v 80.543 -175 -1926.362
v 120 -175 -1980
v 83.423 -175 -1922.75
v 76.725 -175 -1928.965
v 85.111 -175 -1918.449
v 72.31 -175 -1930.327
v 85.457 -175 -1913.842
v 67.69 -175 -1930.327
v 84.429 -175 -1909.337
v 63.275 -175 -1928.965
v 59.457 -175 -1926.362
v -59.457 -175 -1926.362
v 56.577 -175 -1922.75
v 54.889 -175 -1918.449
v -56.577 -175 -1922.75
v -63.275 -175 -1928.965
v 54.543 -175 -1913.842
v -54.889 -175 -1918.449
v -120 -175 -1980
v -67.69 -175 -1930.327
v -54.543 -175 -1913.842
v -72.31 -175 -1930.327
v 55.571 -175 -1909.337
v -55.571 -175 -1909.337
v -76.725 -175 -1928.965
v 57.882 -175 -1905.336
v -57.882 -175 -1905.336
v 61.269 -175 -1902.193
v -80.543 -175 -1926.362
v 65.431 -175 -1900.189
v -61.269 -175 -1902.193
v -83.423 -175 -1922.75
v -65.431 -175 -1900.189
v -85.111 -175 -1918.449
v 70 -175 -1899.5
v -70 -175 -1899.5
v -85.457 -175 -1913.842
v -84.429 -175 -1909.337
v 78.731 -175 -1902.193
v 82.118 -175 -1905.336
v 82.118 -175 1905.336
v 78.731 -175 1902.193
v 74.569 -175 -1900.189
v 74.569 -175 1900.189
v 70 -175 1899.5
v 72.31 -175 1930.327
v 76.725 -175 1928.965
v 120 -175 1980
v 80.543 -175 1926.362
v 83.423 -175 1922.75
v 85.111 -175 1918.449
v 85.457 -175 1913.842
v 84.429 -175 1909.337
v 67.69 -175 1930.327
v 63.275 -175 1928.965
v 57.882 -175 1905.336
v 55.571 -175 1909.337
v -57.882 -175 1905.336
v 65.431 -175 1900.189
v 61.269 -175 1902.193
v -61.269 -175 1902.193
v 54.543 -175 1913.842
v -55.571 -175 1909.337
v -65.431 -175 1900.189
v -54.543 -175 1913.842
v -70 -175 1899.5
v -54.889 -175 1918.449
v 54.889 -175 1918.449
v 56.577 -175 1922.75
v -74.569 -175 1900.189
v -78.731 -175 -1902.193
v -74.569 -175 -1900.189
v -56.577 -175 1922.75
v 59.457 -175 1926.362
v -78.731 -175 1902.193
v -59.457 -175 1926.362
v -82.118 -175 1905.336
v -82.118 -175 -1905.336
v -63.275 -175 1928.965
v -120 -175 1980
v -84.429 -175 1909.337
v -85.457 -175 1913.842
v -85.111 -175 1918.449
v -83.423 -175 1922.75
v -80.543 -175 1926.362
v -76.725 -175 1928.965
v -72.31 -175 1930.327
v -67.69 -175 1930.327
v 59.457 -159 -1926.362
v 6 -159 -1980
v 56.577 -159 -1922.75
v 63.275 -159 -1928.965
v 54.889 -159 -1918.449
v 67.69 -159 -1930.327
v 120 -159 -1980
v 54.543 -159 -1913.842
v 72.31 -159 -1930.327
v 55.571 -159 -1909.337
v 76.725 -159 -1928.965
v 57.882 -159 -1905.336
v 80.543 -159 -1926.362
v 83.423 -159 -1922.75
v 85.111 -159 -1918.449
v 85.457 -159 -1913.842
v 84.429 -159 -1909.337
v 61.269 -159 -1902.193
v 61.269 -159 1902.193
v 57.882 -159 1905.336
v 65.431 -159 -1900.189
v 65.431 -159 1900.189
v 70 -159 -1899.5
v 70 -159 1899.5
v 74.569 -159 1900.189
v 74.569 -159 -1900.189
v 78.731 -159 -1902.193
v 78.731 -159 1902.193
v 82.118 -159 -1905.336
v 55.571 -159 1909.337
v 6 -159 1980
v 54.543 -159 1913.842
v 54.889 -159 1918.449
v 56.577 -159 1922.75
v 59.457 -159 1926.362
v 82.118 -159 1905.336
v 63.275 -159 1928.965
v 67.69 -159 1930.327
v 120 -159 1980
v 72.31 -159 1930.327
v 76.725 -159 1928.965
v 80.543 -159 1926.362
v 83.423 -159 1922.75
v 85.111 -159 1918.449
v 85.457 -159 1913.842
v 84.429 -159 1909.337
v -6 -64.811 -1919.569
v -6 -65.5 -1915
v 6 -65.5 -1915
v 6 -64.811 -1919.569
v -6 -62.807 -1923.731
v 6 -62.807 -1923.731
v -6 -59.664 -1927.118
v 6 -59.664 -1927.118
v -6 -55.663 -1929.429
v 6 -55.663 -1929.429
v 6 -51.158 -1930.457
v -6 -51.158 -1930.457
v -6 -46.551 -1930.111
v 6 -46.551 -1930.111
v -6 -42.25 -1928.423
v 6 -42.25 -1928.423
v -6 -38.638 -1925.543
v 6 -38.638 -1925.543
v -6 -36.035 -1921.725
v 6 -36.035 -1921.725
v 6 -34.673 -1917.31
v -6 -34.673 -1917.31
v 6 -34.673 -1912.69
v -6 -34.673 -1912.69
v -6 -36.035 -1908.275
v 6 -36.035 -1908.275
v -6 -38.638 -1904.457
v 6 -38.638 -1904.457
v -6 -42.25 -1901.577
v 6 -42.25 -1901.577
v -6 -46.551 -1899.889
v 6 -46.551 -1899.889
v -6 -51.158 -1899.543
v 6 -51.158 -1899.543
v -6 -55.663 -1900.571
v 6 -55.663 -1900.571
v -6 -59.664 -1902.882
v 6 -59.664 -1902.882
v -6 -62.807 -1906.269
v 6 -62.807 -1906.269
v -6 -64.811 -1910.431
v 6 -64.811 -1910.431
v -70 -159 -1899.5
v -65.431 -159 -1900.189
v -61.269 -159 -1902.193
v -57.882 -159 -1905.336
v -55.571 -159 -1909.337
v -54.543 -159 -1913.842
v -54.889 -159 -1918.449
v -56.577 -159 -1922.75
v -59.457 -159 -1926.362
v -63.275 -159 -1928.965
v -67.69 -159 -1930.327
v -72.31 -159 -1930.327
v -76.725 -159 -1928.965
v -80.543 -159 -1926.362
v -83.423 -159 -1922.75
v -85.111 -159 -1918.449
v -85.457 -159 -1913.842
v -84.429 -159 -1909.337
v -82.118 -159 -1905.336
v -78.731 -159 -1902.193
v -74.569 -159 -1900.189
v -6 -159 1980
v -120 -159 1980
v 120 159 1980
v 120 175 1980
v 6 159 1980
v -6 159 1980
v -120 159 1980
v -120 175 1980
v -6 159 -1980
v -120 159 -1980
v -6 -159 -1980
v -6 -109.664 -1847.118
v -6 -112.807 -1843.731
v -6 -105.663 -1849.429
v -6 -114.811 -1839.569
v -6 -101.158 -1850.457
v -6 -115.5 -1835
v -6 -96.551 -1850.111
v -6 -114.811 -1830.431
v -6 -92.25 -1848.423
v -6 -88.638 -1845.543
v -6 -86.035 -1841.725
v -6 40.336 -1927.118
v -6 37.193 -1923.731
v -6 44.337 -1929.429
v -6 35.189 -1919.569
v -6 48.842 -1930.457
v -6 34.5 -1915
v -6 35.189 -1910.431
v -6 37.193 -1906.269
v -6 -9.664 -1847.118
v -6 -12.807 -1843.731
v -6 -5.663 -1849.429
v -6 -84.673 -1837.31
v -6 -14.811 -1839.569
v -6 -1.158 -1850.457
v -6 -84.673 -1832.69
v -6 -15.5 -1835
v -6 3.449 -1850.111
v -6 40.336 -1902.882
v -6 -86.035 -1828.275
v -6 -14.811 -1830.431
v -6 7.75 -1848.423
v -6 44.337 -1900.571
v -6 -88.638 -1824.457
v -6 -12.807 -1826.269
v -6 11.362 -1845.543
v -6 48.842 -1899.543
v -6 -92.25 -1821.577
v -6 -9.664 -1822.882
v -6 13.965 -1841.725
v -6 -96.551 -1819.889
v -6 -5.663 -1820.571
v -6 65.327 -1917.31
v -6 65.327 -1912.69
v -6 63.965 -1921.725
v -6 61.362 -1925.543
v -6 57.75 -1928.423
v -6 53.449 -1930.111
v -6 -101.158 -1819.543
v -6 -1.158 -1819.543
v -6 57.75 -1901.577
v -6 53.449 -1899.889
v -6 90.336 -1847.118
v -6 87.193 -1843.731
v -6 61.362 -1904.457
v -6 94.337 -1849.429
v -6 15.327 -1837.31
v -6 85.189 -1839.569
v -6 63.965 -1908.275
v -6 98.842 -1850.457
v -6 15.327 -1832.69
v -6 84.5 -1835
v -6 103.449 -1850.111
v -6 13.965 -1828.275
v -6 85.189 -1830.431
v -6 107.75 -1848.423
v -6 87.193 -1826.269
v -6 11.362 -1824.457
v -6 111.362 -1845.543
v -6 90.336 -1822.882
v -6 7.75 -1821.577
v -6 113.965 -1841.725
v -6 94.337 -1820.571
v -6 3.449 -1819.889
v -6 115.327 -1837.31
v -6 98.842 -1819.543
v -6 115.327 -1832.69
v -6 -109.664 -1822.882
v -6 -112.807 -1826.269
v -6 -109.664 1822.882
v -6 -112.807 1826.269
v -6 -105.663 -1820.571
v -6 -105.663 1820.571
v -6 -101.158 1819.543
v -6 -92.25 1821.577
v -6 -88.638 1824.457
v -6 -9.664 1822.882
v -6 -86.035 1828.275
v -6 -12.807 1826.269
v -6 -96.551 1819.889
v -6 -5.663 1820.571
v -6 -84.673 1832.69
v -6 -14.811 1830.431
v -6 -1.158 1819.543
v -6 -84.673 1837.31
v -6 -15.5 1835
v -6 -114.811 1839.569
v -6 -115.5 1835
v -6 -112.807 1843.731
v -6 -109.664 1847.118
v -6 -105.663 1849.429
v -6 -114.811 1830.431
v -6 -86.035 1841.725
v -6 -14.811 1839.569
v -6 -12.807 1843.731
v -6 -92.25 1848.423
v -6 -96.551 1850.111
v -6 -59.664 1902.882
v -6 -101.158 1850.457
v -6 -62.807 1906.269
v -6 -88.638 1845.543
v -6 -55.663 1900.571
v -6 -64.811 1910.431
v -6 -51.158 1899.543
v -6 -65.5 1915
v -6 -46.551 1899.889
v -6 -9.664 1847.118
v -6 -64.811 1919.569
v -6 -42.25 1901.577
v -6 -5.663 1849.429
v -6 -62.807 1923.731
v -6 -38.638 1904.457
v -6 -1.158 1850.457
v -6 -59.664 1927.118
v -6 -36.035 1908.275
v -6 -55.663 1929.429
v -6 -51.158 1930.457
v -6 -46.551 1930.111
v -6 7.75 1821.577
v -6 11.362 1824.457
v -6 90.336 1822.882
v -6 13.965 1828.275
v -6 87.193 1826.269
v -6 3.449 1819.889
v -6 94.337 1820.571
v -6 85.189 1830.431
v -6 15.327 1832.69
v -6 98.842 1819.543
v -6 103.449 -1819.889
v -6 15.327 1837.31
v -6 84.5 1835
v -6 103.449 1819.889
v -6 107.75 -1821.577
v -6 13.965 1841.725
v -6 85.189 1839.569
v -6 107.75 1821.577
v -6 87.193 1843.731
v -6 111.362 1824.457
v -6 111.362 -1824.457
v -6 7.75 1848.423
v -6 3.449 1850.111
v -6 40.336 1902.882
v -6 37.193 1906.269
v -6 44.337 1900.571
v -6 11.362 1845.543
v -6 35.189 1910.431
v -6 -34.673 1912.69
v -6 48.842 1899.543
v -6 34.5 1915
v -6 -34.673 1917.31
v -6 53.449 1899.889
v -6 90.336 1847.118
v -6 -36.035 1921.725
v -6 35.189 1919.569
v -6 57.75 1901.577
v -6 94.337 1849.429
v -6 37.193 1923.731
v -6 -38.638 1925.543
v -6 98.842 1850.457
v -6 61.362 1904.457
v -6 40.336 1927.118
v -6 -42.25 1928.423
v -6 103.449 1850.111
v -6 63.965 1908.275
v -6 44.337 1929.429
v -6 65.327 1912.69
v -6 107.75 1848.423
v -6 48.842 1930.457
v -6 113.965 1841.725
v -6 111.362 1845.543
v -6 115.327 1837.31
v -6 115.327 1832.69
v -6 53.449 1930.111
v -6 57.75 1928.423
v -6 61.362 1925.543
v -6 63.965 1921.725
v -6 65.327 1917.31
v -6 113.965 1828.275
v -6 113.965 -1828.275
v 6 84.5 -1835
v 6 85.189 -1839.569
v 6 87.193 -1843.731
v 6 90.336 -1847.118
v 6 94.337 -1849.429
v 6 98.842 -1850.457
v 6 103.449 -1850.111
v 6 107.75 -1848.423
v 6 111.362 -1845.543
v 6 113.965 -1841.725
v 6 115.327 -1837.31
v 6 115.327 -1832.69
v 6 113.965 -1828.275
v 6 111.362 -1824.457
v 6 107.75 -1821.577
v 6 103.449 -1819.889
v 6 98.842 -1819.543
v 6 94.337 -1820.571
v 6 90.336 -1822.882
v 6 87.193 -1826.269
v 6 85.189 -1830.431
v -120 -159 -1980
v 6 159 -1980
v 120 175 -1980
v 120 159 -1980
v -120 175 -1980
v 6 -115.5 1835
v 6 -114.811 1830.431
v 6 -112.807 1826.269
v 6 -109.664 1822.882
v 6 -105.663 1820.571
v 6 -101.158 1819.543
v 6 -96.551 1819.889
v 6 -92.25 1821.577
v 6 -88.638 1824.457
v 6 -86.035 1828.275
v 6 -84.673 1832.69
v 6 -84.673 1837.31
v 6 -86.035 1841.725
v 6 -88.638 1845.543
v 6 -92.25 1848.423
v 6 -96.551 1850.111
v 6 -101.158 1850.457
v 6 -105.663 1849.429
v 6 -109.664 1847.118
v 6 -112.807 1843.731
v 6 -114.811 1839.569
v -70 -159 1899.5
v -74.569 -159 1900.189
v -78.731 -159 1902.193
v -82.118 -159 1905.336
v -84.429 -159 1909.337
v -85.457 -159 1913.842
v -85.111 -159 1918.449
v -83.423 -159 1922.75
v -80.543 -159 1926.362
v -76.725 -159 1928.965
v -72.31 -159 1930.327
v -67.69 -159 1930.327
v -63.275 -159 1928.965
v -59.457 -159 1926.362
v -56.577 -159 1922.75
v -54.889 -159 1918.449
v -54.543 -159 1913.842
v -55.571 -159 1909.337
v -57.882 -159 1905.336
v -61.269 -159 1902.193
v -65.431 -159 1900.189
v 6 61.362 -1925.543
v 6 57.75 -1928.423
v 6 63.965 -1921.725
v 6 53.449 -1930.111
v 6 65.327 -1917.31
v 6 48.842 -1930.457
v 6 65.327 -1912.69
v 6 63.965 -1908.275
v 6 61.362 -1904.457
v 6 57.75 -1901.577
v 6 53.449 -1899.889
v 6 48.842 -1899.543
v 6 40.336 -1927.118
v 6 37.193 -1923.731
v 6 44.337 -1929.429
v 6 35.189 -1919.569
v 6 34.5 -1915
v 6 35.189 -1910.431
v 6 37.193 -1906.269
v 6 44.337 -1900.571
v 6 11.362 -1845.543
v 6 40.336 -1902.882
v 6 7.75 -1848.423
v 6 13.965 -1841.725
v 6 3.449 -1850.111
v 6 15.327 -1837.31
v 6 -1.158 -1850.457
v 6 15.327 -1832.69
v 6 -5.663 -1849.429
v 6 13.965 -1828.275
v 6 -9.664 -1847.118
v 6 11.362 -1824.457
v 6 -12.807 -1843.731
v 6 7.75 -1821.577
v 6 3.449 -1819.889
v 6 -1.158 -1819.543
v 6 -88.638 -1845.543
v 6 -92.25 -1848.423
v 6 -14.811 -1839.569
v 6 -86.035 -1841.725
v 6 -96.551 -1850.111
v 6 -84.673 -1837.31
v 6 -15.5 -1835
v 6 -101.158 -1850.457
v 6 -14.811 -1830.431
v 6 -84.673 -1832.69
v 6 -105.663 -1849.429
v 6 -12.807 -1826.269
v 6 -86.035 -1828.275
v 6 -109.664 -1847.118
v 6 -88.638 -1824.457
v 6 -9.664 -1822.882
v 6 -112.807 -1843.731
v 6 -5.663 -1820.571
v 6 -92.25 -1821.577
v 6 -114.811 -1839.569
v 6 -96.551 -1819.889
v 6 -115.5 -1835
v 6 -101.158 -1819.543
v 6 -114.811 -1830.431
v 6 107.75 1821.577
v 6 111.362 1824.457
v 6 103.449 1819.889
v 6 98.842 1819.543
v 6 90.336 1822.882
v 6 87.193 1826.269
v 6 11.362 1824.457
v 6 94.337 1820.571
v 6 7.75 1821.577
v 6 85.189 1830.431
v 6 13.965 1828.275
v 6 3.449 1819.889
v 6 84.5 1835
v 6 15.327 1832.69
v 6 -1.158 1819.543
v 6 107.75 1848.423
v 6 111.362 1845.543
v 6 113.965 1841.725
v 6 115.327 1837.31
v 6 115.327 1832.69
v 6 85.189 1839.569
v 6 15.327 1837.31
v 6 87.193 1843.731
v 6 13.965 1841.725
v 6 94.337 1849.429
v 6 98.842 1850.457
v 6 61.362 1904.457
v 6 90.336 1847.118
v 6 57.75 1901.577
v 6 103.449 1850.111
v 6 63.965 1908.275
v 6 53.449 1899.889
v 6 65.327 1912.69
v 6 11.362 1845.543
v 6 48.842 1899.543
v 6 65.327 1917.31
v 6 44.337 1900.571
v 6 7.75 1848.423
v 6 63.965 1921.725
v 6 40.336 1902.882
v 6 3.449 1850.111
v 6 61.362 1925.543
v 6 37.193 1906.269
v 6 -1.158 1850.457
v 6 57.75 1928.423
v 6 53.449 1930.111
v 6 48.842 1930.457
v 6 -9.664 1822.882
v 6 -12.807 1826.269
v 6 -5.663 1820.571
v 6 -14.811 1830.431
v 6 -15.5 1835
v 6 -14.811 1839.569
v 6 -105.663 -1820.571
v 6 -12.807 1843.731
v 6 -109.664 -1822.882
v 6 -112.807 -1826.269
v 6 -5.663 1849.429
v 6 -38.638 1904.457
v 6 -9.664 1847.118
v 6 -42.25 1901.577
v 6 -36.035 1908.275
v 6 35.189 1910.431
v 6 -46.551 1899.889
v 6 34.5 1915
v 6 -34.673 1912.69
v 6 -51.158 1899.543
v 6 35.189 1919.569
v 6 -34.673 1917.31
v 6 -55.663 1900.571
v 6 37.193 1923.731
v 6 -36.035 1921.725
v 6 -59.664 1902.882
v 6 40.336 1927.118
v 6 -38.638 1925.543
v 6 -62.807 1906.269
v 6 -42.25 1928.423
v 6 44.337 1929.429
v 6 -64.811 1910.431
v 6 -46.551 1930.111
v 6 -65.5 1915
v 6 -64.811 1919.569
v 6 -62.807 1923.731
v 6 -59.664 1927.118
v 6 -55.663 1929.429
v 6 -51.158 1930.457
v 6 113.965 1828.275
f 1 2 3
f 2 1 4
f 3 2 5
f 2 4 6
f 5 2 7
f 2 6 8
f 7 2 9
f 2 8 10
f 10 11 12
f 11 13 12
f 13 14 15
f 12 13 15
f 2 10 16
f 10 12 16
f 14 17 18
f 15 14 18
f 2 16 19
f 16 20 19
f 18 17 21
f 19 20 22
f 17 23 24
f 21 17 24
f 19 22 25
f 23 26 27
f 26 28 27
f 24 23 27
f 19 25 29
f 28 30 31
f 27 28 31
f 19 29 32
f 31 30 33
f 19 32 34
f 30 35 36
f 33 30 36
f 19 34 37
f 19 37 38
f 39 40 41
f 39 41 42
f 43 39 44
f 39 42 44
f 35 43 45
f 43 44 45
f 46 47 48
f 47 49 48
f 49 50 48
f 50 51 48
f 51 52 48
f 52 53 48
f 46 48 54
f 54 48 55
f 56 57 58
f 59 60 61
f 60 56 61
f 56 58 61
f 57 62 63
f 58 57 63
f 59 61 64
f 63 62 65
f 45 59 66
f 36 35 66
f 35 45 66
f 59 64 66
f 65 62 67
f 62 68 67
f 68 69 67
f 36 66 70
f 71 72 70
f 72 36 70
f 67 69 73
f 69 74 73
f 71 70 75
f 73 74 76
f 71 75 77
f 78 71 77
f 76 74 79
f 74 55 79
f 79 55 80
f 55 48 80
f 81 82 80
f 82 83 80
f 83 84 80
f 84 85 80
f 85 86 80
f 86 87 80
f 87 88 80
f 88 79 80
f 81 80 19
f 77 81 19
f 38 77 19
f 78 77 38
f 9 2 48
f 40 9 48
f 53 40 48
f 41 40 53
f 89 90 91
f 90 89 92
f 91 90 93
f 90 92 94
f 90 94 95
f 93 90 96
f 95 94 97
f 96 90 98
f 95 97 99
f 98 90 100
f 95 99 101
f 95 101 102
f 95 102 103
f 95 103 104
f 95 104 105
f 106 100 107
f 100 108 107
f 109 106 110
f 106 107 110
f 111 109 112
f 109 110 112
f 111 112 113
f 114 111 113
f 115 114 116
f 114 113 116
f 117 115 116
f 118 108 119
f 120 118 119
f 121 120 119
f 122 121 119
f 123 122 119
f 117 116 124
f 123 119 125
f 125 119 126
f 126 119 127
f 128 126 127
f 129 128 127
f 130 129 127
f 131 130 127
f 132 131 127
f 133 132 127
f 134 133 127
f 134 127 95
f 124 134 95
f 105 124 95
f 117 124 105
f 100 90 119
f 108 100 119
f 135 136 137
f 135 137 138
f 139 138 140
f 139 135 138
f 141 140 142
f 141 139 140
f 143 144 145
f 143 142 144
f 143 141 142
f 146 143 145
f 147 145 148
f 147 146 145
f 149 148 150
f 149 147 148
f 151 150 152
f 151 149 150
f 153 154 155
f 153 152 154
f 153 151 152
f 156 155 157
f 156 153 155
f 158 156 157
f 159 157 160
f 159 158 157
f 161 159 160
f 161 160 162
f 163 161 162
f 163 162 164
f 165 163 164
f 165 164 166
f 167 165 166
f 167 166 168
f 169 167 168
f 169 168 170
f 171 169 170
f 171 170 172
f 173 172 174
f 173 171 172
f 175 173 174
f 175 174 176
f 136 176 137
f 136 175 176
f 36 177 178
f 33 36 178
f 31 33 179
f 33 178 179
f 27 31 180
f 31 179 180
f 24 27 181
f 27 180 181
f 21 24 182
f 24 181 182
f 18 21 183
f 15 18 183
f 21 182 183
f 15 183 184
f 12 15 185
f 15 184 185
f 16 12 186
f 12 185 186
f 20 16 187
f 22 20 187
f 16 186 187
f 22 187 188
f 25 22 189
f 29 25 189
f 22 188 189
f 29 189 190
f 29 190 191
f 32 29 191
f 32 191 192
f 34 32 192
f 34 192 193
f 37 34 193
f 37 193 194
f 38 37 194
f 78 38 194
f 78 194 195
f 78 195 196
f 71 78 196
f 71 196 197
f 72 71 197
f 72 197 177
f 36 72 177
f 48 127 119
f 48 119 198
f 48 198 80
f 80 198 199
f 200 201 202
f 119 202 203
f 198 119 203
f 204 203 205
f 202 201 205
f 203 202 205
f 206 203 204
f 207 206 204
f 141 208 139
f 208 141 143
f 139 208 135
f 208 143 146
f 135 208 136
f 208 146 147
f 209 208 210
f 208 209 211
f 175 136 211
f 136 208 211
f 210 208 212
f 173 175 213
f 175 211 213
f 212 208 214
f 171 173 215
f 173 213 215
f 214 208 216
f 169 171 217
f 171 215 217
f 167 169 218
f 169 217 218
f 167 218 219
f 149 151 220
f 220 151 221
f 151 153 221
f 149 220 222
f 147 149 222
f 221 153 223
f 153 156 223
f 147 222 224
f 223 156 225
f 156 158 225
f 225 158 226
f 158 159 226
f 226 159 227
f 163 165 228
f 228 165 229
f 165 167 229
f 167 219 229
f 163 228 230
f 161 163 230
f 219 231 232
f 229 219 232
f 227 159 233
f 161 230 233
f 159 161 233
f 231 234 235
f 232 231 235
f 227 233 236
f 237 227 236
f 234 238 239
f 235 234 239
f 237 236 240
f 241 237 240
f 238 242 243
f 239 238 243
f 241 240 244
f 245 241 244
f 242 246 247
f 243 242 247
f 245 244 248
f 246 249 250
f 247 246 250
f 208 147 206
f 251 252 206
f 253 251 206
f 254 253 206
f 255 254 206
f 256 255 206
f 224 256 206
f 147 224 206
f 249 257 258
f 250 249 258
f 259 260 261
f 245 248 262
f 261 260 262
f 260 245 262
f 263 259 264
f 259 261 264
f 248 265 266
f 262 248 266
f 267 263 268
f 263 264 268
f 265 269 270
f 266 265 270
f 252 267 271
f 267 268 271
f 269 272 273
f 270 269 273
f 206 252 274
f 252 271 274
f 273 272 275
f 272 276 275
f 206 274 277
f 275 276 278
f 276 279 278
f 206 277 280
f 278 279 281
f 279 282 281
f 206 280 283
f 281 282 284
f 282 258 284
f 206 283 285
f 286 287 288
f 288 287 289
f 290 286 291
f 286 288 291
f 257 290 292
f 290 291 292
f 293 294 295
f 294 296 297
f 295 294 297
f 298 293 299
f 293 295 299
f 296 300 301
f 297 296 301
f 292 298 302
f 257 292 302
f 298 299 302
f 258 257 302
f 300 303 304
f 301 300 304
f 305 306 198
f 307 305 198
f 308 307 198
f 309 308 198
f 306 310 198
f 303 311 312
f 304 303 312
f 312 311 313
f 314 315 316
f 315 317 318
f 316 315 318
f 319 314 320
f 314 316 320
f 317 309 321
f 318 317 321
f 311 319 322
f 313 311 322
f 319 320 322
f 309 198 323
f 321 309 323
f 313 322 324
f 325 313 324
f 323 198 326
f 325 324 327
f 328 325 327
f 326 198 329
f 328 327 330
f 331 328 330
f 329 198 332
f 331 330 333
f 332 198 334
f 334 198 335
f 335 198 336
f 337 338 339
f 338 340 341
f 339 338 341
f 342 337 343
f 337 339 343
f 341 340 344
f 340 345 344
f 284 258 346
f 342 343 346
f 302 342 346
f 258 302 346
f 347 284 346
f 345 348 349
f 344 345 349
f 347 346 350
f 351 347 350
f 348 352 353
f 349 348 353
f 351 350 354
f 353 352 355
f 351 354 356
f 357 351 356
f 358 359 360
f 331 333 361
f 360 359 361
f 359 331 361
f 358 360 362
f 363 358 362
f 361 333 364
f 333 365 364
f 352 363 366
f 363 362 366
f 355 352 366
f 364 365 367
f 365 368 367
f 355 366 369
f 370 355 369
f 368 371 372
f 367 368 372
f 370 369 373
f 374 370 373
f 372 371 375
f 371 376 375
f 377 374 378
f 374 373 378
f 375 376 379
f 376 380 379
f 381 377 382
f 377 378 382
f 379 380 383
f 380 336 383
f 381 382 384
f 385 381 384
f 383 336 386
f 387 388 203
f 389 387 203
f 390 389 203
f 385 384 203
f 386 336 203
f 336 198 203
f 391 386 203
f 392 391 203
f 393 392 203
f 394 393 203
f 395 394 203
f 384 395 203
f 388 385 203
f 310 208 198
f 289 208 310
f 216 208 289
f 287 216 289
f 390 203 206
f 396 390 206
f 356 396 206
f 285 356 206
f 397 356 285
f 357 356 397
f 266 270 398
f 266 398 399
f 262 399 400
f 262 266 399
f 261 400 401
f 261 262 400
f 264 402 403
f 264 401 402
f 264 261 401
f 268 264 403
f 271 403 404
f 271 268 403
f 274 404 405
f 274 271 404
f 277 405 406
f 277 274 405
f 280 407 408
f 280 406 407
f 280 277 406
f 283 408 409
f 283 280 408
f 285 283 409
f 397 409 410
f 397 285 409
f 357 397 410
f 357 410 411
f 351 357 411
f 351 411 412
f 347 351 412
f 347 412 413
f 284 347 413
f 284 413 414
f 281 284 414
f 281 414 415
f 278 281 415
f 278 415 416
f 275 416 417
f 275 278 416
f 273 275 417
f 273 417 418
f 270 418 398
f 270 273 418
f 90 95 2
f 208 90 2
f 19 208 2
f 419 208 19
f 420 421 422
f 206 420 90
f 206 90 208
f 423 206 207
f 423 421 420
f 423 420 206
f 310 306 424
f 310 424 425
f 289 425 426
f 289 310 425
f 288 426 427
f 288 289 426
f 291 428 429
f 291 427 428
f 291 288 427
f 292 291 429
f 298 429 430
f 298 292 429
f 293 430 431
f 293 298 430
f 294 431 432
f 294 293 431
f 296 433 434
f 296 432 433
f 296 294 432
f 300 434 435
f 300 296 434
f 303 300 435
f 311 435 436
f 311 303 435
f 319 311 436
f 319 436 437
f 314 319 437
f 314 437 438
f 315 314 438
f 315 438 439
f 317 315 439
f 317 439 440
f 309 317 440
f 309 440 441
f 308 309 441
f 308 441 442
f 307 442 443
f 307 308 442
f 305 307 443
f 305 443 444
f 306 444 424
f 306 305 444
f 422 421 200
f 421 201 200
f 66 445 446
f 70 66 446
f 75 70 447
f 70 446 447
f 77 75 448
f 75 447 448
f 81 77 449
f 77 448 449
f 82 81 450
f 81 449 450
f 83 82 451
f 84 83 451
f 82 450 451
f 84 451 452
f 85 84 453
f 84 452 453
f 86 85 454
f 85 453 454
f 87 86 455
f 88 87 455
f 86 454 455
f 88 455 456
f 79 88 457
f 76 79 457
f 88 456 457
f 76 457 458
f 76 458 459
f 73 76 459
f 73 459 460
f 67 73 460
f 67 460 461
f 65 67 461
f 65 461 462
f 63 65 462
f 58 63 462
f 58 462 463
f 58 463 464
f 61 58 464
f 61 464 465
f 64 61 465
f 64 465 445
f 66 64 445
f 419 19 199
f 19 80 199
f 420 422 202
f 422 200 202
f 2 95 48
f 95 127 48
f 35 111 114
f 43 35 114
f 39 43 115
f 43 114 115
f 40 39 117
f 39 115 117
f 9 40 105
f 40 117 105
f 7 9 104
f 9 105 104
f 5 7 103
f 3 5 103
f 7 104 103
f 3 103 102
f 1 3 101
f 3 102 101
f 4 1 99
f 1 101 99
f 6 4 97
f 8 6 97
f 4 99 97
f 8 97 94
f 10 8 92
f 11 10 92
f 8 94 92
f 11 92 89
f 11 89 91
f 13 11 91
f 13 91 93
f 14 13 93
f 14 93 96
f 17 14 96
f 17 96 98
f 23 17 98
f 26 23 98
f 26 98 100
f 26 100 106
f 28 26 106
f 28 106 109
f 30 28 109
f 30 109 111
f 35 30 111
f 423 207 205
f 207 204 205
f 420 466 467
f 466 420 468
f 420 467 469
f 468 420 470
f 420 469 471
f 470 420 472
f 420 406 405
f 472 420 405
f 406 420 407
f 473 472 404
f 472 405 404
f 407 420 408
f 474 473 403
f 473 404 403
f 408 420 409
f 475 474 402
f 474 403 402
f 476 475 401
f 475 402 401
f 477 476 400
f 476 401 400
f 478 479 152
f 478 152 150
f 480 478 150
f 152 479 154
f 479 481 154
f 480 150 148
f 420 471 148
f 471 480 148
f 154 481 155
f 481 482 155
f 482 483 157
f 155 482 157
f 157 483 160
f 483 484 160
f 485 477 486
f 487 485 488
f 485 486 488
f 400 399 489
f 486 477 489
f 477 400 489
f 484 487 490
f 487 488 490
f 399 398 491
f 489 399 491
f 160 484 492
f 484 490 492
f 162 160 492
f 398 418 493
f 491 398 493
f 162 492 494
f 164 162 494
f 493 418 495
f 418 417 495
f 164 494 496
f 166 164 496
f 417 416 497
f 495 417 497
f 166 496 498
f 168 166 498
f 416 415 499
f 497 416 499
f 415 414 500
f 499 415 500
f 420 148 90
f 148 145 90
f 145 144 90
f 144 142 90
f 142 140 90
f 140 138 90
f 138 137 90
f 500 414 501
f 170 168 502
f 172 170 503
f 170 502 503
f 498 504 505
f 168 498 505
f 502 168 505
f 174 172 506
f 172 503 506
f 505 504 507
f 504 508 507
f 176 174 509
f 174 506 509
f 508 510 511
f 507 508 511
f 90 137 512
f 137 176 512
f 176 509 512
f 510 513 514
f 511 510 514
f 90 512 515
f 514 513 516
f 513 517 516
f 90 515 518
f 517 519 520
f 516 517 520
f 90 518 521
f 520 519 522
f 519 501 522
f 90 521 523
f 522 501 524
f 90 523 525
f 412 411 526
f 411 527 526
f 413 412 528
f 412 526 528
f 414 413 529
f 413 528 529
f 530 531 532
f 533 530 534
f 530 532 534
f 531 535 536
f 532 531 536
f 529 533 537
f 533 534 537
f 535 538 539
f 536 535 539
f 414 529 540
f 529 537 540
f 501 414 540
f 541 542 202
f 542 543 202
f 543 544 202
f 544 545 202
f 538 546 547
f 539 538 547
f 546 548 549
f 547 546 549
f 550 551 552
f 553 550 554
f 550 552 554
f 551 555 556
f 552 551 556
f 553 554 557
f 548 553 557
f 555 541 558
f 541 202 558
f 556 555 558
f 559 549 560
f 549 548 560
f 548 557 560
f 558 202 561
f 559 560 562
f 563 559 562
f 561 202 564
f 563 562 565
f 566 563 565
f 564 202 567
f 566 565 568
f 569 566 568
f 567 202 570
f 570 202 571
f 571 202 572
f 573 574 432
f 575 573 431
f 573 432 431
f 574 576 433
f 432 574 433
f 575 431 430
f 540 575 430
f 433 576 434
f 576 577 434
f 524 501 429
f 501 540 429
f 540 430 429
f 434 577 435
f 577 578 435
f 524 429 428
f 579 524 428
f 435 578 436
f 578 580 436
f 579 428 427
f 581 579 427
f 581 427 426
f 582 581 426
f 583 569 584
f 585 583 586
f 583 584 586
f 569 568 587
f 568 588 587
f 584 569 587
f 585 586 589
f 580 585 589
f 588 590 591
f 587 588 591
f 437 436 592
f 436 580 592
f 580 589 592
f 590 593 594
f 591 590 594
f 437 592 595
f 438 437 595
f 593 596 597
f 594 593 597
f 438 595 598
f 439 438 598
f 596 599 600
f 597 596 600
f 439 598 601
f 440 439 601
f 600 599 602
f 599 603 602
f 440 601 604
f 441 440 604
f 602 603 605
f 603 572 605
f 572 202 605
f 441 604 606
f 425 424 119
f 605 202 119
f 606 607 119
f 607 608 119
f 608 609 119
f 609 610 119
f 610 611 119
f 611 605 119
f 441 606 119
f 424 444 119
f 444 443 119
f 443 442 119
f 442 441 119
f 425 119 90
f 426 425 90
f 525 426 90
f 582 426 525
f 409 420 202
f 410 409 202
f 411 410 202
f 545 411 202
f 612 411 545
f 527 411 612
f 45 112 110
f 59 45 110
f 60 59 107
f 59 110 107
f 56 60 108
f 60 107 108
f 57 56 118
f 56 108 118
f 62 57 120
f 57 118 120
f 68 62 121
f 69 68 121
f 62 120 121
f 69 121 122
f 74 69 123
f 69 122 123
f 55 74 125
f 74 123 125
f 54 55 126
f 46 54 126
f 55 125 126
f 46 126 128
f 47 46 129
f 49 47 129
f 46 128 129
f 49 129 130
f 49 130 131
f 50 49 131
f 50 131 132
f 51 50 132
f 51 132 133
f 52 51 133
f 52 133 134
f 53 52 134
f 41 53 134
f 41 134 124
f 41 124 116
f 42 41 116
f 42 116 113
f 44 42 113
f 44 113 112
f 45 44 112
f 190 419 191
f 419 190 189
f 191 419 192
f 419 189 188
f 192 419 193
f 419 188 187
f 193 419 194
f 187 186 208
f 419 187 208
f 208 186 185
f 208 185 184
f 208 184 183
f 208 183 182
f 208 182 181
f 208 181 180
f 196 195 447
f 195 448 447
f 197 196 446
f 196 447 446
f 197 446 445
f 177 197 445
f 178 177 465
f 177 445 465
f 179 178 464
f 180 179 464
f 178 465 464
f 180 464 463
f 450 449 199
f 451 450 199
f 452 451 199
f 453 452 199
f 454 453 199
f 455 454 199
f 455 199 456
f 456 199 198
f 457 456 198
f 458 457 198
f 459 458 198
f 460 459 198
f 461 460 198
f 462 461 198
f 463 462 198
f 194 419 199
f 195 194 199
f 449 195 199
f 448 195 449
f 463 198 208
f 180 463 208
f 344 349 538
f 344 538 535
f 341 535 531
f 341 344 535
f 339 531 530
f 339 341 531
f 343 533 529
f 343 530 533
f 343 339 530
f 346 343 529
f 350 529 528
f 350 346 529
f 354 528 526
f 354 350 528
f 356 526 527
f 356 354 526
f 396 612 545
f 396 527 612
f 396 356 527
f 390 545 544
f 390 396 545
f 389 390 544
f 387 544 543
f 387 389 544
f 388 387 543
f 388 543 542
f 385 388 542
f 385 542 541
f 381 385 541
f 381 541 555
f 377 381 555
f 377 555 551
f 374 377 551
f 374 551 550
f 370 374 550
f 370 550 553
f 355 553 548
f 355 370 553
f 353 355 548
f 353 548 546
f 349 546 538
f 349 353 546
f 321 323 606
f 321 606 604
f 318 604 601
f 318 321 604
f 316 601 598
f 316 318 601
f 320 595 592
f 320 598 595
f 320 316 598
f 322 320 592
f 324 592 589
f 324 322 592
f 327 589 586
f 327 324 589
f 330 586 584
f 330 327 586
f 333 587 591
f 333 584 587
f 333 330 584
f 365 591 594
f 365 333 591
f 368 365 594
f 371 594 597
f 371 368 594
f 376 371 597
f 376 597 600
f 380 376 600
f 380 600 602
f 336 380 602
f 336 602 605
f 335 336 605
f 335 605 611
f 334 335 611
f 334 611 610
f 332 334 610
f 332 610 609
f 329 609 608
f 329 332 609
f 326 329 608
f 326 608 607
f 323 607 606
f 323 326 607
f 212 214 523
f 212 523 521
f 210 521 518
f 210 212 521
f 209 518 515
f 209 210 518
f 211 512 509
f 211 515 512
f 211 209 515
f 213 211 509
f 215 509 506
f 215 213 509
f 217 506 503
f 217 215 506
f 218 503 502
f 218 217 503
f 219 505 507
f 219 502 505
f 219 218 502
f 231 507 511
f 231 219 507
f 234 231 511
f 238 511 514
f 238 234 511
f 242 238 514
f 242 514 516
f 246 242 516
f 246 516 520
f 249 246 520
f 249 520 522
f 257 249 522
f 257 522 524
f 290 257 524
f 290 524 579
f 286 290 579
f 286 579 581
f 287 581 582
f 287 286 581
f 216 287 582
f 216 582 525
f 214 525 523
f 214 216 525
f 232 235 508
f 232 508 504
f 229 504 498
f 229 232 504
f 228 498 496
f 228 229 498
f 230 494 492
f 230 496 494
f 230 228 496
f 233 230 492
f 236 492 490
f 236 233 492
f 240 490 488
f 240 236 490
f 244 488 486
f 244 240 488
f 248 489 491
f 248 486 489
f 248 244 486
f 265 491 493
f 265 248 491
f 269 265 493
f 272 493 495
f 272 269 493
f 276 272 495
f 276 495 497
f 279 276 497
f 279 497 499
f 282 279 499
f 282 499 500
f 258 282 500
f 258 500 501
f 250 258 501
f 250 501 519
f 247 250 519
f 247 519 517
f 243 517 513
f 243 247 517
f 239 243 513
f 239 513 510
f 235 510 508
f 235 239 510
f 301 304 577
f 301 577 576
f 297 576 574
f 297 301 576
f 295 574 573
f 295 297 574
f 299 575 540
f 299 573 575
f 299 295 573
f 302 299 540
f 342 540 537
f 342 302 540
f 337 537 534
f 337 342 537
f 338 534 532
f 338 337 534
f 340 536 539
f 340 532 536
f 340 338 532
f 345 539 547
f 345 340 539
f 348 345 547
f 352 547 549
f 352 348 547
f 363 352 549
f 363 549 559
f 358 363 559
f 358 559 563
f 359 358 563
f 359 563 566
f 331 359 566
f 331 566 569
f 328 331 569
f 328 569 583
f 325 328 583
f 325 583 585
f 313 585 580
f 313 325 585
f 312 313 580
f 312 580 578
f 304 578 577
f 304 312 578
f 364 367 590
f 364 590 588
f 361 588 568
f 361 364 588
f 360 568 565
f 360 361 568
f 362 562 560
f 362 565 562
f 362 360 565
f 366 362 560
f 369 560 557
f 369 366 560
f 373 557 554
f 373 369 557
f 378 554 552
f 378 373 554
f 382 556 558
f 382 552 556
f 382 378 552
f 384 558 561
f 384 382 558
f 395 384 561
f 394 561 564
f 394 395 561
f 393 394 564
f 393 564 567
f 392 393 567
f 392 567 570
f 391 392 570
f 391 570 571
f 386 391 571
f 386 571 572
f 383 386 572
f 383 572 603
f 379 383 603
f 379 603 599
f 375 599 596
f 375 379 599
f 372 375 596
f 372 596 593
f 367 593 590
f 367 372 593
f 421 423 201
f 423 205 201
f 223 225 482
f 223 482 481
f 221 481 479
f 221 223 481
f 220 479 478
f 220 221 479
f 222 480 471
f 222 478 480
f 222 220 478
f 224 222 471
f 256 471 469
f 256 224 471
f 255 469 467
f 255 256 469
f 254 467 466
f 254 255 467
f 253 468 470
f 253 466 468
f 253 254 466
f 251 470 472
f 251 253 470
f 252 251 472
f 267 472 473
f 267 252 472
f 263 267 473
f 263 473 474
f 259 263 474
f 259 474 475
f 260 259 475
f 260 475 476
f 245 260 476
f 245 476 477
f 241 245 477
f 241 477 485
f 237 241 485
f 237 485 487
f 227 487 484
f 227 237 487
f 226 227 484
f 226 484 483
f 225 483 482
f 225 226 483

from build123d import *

# Parameters (mm, degrees)
EXTRUDE_1_DEPTH          = 1980
CUT_EXTRUDE_2_DEPTH      = 1992.337490231
CUT_EXTRUDE_2_DEPTH_BACK = 1992.337490231
SKETCH_2_R               = 15.5
SKETCH_5_R               = 15.5
CUT_EXTRUDE_4_DEPTH      = 2012.555616929


with BuildPart() as part:
    # 草图1 → 拉伸1 (new, symmetric)
    with BuildSketch(Plane.XY):
        Polygon((-6, 159), (-120, 159), (-120, 175), (120, 175), (120, 159), (6, 159), (6, -159), (120, -159), (120, -175), (-120, -175), (-120, -159), (-6, -159), align=None)
    extrude(amount=EXTRUDE_1_DEPTH, both=True)

    # 草图2 → 拉伸2 (cut, two sides: drawn at the far end of the back side and taken through both)
    with BuildSketch(Plane(origin=(0, 0, 0), x_dir=(0, 0, -1), z_dir=(1, 0, 0)).offset(-CUT_EXTRUDE_2_DEPTH_BACK)):
        with Locations(Location((-1915, 50, 0), (0, 0, 270))):
            Circle(SKETCH_2_R)
        with Locations(Location((-1835, 0, 0), (0, 0, 270))):
            Circle(SKETCH_2_R)
        with Locations(Location((-1835, 100, 0), (0, 0, 270))):
            Circle(SKETCH_2_R)
        with Locations(Location((-1835, -100, 0), (0, 0, 270))):
            Circle(SKETCH_2_R)
        with Locations(Location((-1915, -50, 0), (0, 0, 270))):
            Circle(SKETCH_2_R)
        with Locations(Location((1915, -50, 0), (0, 0, 270))):
            Circle(SKETCH_2_R)
        with Locations(Location((1835, -100, 0), (0, 0, 270))):
            Circle(SKETCH_2_R)
        with Locations(Location((1835, 100, 0), (0, 0, 270))):
            Circle(SKETCH_2_R)
        with Locations(Location((1835, 0, 0), (0, 0, 270))):
            Circle(SKETCH_2_R)
        with Locations(Location((1915, 50, 0), (0, 0, 270))):
            Circle(SKETCH_2_R)
    extrude(amount=CUT_EXTRUDE_2_DEPTH + CUT_EXTRUDE_2_DEPTH_BACK, mode=Mode.SUBTRACT)

    # 草图5 → 拉伸4 (cut, through all)
    with BuildSketch(Plane(origin=(0, -159, 0), x_dir=(1, 0, 0), z_dir=(0, 1, 0))):
        with Locations(Location((-70, 1915, 0), (0, 0, 270))):
            Circle(SKETCH_5_R)
        with Locations(Location((70, 1915, 0), (0, 0, 270))):
            Circle(SKETCH_5_R)
        with Locations(Location((70, -1915, 0), (0, 0, 90))):
            Circle(SKETCH_5_R)
        with Locations(Location((-70, -1915, 0), (0, 0, 90))):
            Circle(SKETCH_5_R)
    extrude(amount=-CUT_EXTRUDE_4_DEPTH, mode=Mode.SUBTRACT)


solid = part.part
